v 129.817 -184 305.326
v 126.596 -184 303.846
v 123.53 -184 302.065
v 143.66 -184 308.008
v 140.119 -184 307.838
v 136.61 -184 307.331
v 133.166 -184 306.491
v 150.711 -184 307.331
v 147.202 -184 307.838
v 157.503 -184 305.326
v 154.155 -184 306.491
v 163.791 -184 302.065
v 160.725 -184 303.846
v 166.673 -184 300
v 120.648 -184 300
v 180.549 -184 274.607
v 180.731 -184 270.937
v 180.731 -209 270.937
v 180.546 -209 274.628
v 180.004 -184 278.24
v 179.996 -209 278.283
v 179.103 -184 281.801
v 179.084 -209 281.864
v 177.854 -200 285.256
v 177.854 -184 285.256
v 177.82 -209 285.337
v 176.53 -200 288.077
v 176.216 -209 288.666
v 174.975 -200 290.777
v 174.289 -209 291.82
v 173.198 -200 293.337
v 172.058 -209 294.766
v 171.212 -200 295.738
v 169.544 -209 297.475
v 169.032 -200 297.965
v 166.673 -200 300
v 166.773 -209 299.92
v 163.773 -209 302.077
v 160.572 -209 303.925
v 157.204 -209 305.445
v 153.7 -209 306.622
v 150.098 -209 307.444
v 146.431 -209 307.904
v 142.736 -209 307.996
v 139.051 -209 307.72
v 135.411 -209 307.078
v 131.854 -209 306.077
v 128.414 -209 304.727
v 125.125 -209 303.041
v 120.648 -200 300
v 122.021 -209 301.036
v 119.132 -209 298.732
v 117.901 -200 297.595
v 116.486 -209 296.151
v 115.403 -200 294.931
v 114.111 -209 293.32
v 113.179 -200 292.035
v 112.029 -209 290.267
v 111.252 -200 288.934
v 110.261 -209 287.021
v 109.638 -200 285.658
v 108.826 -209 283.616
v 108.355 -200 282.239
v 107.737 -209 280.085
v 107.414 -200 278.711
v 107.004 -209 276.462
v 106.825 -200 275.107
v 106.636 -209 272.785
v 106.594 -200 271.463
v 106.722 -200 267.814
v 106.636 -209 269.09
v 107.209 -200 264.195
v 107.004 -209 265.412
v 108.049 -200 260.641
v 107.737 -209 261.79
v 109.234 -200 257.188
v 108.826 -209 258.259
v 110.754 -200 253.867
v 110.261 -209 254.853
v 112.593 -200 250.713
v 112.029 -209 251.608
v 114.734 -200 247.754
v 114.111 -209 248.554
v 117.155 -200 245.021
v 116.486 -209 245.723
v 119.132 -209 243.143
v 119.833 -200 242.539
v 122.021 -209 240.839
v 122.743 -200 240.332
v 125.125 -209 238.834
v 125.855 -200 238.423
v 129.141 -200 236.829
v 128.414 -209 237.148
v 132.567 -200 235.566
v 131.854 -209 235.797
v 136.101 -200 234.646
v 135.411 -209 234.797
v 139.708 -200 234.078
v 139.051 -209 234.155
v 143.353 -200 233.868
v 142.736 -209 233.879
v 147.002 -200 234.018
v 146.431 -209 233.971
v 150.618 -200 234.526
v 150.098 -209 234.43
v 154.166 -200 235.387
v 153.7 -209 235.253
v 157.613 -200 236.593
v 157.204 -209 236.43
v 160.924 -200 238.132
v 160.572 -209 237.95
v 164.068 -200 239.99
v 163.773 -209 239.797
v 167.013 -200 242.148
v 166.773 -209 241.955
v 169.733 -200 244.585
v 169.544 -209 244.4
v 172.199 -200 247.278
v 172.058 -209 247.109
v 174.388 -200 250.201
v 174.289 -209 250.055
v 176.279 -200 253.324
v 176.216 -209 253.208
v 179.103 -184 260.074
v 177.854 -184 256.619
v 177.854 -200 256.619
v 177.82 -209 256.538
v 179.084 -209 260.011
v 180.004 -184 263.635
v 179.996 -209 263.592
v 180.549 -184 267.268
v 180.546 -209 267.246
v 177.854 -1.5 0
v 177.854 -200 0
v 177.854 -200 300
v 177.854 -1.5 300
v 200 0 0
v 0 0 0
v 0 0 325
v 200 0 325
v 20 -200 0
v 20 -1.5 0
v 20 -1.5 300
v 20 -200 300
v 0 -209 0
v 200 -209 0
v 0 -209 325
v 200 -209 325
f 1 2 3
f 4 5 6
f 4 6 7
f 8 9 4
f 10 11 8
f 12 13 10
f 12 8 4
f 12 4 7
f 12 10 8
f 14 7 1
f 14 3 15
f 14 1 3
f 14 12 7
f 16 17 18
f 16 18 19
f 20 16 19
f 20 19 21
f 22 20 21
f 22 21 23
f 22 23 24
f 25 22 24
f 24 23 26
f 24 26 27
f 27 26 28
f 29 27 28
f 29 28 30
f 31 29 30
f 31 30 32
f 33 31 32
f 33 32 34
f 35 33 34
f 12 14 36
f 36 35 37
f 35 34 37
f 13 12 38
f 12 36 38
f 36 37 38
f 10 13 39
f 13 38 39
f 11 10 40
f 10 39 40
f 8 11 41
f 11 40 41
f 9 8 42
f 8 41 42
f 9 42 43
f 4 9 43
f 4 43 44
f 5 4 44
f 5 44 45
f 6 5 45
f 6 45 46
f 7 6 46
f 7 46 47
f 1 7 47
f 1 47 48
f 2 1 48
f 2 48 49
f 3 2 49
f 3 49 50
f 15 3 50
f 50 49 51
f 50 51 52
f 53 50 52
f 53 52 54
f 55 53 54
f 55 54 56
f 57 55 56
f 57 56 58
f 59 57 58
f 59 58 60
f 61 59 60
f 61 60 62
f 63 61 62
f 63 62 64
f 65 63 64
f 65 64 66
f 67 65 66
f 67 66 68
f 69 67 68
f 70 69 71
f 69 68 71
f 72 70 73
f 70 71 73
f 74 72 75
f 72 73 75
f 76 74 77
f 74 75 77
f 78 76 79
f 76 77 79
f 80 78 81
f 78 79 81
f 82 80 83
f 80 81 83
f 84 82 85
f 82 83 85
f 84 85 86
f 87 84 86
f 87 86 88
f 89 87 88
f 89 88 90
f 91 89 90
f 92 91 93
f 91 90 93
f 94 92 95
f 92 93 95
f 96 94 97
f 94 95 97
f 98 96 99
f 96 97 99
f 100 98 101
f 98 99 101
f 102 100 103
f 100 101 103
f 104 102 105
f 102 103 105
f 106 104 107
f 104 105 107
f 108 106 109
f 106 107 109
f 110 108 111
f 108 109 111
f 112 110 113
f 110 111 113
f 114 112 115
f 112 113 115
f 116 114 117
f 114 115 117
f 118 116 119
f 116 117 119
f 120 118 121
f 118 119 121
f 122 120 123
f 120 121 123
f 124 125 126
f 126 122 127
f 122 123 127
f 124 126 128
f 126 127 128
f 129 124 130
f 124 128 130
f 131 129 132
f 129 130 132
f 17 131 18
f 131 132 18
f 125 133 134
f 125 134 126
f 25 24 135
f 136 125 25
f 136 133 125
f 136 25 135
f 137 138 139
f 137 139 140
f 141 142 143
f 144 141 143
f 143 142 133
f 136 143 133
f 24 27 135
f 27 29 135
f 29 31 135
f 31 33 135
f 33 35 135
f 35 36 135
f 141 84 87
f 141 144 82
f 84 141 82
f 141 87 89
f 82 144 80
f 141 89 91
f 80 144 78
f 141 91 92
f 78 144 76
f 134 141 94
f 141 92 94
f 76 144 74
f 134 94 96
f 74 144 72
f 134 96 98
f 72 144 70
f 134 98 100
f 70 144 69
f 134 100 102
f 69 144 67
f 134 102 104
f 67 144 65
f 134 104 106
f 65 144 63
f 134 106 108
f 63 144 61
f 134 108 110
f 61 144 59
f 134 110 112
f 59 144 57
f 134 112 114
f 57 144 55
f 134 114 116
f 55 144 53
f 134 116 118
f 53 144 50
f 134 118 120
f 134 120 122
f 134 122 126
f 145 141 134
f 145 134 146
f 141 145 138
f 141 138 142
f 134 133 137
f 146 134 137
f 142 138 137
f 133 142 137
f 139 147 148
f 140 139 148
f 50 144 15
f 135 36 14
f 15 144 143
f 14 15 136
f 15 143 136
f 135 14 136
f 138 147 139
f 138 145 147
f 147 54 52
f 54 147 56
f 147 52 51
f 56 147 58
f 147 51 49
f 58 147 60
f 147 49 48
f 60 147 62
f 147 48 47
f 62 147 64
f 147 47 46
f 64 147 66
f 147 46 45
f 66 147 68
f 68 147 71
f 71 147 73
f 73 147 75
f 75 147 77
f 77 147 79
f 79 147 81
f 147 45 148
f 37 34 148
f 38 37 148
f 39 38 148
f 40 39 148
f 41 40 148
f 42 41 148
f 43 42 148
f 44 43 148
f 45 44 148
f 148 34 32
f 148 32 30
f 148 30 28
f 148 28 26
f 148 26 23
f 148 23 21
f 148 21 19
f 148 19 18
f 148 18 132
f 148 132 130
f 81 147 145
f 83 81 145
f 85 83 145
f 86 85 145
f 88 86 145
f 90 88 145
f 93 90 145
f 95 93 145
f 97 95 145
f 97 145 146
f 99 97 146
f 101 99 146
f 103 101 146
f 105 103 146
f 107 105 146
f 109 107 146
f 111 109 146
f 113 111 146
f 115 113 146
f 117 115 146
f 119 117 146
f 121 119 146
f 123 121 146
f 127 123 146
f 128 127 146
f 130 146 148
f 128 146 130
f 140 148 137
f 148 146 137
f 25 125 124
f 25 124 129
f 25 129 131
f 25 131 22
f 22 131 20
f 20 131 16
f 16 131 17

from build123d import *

# Parameters (mm, degrees)
F1_W      = 20
F1_H      = 300
F2_DEPTH  = 200
F0_W      = 200
F0_H      = 300
F3_DEPTH  = 1.5
F4_W      = 22.1463561058
F4_H      = 300
F5_DEPTH  = 200
F6_W      = 200
F6_H      = 300
F7_DEPTH  = 9
F8_W      = 200
F8_H      = 209
F9_DEPTH  = 25
F10_R     = 37.0701897266
F11_DEPTH = 25


with BuildPart() as f2:
    # F1 (on face) → F2 (new body)
    with BuildSketch(Plane.XZ):
        with Locations((10, 150)):
            Rectangle(F1_W, F1_H)
    extrude(amount=F2_DEPTH)

    # F0 (on Front) + F1 (on face) → F3 (join)
    with BuildSketch(Plane.XZ):
        with Locations((100, 150)):
            Rectangle(F0_W, F0_H)
    with BuildSketch(Plane.XZ):
        with Locations((10, 150)):
            Rectangle(F1_W, F1_H)
    extrude(amount=F3_DEPTH)

    # F4 (on face) → F5 (join)
    with BuildSketch(Plane.XZ.offset(1.5)):
        with Locations((188.9268219471, 150)):
            Rectangle(F4_W, F4_H)
    extrude(amount=F5_DEPTH)

    # F6 (on face) → F7 (join)
    with BuildSketch(Plane.XZ.offset(200)):
        with Locations((100, 150)):
            Rectangle(F6_W, F6_H)
    extrude(amount=F7_DEPTH)

    # F8 (on face) → F9 (join)
    with BuildSketch(Plane.XY.offset(300)):
        with Locations((100, -104.5)):
            Rectangle(F8_W, F8_H)
    extrude(amount=F9_DEPTH)

    # F10 (on face) → F11 (cut)
    with BuildSketch(Plane.XZ.offset(209)):
        with Locations((143.6603814363, 270.9373235703)):
            Circle(F10_R)
    extrude(amount=-F11_DEPTH, mode=Mode.SUBTRACT)


solid = f2.part
